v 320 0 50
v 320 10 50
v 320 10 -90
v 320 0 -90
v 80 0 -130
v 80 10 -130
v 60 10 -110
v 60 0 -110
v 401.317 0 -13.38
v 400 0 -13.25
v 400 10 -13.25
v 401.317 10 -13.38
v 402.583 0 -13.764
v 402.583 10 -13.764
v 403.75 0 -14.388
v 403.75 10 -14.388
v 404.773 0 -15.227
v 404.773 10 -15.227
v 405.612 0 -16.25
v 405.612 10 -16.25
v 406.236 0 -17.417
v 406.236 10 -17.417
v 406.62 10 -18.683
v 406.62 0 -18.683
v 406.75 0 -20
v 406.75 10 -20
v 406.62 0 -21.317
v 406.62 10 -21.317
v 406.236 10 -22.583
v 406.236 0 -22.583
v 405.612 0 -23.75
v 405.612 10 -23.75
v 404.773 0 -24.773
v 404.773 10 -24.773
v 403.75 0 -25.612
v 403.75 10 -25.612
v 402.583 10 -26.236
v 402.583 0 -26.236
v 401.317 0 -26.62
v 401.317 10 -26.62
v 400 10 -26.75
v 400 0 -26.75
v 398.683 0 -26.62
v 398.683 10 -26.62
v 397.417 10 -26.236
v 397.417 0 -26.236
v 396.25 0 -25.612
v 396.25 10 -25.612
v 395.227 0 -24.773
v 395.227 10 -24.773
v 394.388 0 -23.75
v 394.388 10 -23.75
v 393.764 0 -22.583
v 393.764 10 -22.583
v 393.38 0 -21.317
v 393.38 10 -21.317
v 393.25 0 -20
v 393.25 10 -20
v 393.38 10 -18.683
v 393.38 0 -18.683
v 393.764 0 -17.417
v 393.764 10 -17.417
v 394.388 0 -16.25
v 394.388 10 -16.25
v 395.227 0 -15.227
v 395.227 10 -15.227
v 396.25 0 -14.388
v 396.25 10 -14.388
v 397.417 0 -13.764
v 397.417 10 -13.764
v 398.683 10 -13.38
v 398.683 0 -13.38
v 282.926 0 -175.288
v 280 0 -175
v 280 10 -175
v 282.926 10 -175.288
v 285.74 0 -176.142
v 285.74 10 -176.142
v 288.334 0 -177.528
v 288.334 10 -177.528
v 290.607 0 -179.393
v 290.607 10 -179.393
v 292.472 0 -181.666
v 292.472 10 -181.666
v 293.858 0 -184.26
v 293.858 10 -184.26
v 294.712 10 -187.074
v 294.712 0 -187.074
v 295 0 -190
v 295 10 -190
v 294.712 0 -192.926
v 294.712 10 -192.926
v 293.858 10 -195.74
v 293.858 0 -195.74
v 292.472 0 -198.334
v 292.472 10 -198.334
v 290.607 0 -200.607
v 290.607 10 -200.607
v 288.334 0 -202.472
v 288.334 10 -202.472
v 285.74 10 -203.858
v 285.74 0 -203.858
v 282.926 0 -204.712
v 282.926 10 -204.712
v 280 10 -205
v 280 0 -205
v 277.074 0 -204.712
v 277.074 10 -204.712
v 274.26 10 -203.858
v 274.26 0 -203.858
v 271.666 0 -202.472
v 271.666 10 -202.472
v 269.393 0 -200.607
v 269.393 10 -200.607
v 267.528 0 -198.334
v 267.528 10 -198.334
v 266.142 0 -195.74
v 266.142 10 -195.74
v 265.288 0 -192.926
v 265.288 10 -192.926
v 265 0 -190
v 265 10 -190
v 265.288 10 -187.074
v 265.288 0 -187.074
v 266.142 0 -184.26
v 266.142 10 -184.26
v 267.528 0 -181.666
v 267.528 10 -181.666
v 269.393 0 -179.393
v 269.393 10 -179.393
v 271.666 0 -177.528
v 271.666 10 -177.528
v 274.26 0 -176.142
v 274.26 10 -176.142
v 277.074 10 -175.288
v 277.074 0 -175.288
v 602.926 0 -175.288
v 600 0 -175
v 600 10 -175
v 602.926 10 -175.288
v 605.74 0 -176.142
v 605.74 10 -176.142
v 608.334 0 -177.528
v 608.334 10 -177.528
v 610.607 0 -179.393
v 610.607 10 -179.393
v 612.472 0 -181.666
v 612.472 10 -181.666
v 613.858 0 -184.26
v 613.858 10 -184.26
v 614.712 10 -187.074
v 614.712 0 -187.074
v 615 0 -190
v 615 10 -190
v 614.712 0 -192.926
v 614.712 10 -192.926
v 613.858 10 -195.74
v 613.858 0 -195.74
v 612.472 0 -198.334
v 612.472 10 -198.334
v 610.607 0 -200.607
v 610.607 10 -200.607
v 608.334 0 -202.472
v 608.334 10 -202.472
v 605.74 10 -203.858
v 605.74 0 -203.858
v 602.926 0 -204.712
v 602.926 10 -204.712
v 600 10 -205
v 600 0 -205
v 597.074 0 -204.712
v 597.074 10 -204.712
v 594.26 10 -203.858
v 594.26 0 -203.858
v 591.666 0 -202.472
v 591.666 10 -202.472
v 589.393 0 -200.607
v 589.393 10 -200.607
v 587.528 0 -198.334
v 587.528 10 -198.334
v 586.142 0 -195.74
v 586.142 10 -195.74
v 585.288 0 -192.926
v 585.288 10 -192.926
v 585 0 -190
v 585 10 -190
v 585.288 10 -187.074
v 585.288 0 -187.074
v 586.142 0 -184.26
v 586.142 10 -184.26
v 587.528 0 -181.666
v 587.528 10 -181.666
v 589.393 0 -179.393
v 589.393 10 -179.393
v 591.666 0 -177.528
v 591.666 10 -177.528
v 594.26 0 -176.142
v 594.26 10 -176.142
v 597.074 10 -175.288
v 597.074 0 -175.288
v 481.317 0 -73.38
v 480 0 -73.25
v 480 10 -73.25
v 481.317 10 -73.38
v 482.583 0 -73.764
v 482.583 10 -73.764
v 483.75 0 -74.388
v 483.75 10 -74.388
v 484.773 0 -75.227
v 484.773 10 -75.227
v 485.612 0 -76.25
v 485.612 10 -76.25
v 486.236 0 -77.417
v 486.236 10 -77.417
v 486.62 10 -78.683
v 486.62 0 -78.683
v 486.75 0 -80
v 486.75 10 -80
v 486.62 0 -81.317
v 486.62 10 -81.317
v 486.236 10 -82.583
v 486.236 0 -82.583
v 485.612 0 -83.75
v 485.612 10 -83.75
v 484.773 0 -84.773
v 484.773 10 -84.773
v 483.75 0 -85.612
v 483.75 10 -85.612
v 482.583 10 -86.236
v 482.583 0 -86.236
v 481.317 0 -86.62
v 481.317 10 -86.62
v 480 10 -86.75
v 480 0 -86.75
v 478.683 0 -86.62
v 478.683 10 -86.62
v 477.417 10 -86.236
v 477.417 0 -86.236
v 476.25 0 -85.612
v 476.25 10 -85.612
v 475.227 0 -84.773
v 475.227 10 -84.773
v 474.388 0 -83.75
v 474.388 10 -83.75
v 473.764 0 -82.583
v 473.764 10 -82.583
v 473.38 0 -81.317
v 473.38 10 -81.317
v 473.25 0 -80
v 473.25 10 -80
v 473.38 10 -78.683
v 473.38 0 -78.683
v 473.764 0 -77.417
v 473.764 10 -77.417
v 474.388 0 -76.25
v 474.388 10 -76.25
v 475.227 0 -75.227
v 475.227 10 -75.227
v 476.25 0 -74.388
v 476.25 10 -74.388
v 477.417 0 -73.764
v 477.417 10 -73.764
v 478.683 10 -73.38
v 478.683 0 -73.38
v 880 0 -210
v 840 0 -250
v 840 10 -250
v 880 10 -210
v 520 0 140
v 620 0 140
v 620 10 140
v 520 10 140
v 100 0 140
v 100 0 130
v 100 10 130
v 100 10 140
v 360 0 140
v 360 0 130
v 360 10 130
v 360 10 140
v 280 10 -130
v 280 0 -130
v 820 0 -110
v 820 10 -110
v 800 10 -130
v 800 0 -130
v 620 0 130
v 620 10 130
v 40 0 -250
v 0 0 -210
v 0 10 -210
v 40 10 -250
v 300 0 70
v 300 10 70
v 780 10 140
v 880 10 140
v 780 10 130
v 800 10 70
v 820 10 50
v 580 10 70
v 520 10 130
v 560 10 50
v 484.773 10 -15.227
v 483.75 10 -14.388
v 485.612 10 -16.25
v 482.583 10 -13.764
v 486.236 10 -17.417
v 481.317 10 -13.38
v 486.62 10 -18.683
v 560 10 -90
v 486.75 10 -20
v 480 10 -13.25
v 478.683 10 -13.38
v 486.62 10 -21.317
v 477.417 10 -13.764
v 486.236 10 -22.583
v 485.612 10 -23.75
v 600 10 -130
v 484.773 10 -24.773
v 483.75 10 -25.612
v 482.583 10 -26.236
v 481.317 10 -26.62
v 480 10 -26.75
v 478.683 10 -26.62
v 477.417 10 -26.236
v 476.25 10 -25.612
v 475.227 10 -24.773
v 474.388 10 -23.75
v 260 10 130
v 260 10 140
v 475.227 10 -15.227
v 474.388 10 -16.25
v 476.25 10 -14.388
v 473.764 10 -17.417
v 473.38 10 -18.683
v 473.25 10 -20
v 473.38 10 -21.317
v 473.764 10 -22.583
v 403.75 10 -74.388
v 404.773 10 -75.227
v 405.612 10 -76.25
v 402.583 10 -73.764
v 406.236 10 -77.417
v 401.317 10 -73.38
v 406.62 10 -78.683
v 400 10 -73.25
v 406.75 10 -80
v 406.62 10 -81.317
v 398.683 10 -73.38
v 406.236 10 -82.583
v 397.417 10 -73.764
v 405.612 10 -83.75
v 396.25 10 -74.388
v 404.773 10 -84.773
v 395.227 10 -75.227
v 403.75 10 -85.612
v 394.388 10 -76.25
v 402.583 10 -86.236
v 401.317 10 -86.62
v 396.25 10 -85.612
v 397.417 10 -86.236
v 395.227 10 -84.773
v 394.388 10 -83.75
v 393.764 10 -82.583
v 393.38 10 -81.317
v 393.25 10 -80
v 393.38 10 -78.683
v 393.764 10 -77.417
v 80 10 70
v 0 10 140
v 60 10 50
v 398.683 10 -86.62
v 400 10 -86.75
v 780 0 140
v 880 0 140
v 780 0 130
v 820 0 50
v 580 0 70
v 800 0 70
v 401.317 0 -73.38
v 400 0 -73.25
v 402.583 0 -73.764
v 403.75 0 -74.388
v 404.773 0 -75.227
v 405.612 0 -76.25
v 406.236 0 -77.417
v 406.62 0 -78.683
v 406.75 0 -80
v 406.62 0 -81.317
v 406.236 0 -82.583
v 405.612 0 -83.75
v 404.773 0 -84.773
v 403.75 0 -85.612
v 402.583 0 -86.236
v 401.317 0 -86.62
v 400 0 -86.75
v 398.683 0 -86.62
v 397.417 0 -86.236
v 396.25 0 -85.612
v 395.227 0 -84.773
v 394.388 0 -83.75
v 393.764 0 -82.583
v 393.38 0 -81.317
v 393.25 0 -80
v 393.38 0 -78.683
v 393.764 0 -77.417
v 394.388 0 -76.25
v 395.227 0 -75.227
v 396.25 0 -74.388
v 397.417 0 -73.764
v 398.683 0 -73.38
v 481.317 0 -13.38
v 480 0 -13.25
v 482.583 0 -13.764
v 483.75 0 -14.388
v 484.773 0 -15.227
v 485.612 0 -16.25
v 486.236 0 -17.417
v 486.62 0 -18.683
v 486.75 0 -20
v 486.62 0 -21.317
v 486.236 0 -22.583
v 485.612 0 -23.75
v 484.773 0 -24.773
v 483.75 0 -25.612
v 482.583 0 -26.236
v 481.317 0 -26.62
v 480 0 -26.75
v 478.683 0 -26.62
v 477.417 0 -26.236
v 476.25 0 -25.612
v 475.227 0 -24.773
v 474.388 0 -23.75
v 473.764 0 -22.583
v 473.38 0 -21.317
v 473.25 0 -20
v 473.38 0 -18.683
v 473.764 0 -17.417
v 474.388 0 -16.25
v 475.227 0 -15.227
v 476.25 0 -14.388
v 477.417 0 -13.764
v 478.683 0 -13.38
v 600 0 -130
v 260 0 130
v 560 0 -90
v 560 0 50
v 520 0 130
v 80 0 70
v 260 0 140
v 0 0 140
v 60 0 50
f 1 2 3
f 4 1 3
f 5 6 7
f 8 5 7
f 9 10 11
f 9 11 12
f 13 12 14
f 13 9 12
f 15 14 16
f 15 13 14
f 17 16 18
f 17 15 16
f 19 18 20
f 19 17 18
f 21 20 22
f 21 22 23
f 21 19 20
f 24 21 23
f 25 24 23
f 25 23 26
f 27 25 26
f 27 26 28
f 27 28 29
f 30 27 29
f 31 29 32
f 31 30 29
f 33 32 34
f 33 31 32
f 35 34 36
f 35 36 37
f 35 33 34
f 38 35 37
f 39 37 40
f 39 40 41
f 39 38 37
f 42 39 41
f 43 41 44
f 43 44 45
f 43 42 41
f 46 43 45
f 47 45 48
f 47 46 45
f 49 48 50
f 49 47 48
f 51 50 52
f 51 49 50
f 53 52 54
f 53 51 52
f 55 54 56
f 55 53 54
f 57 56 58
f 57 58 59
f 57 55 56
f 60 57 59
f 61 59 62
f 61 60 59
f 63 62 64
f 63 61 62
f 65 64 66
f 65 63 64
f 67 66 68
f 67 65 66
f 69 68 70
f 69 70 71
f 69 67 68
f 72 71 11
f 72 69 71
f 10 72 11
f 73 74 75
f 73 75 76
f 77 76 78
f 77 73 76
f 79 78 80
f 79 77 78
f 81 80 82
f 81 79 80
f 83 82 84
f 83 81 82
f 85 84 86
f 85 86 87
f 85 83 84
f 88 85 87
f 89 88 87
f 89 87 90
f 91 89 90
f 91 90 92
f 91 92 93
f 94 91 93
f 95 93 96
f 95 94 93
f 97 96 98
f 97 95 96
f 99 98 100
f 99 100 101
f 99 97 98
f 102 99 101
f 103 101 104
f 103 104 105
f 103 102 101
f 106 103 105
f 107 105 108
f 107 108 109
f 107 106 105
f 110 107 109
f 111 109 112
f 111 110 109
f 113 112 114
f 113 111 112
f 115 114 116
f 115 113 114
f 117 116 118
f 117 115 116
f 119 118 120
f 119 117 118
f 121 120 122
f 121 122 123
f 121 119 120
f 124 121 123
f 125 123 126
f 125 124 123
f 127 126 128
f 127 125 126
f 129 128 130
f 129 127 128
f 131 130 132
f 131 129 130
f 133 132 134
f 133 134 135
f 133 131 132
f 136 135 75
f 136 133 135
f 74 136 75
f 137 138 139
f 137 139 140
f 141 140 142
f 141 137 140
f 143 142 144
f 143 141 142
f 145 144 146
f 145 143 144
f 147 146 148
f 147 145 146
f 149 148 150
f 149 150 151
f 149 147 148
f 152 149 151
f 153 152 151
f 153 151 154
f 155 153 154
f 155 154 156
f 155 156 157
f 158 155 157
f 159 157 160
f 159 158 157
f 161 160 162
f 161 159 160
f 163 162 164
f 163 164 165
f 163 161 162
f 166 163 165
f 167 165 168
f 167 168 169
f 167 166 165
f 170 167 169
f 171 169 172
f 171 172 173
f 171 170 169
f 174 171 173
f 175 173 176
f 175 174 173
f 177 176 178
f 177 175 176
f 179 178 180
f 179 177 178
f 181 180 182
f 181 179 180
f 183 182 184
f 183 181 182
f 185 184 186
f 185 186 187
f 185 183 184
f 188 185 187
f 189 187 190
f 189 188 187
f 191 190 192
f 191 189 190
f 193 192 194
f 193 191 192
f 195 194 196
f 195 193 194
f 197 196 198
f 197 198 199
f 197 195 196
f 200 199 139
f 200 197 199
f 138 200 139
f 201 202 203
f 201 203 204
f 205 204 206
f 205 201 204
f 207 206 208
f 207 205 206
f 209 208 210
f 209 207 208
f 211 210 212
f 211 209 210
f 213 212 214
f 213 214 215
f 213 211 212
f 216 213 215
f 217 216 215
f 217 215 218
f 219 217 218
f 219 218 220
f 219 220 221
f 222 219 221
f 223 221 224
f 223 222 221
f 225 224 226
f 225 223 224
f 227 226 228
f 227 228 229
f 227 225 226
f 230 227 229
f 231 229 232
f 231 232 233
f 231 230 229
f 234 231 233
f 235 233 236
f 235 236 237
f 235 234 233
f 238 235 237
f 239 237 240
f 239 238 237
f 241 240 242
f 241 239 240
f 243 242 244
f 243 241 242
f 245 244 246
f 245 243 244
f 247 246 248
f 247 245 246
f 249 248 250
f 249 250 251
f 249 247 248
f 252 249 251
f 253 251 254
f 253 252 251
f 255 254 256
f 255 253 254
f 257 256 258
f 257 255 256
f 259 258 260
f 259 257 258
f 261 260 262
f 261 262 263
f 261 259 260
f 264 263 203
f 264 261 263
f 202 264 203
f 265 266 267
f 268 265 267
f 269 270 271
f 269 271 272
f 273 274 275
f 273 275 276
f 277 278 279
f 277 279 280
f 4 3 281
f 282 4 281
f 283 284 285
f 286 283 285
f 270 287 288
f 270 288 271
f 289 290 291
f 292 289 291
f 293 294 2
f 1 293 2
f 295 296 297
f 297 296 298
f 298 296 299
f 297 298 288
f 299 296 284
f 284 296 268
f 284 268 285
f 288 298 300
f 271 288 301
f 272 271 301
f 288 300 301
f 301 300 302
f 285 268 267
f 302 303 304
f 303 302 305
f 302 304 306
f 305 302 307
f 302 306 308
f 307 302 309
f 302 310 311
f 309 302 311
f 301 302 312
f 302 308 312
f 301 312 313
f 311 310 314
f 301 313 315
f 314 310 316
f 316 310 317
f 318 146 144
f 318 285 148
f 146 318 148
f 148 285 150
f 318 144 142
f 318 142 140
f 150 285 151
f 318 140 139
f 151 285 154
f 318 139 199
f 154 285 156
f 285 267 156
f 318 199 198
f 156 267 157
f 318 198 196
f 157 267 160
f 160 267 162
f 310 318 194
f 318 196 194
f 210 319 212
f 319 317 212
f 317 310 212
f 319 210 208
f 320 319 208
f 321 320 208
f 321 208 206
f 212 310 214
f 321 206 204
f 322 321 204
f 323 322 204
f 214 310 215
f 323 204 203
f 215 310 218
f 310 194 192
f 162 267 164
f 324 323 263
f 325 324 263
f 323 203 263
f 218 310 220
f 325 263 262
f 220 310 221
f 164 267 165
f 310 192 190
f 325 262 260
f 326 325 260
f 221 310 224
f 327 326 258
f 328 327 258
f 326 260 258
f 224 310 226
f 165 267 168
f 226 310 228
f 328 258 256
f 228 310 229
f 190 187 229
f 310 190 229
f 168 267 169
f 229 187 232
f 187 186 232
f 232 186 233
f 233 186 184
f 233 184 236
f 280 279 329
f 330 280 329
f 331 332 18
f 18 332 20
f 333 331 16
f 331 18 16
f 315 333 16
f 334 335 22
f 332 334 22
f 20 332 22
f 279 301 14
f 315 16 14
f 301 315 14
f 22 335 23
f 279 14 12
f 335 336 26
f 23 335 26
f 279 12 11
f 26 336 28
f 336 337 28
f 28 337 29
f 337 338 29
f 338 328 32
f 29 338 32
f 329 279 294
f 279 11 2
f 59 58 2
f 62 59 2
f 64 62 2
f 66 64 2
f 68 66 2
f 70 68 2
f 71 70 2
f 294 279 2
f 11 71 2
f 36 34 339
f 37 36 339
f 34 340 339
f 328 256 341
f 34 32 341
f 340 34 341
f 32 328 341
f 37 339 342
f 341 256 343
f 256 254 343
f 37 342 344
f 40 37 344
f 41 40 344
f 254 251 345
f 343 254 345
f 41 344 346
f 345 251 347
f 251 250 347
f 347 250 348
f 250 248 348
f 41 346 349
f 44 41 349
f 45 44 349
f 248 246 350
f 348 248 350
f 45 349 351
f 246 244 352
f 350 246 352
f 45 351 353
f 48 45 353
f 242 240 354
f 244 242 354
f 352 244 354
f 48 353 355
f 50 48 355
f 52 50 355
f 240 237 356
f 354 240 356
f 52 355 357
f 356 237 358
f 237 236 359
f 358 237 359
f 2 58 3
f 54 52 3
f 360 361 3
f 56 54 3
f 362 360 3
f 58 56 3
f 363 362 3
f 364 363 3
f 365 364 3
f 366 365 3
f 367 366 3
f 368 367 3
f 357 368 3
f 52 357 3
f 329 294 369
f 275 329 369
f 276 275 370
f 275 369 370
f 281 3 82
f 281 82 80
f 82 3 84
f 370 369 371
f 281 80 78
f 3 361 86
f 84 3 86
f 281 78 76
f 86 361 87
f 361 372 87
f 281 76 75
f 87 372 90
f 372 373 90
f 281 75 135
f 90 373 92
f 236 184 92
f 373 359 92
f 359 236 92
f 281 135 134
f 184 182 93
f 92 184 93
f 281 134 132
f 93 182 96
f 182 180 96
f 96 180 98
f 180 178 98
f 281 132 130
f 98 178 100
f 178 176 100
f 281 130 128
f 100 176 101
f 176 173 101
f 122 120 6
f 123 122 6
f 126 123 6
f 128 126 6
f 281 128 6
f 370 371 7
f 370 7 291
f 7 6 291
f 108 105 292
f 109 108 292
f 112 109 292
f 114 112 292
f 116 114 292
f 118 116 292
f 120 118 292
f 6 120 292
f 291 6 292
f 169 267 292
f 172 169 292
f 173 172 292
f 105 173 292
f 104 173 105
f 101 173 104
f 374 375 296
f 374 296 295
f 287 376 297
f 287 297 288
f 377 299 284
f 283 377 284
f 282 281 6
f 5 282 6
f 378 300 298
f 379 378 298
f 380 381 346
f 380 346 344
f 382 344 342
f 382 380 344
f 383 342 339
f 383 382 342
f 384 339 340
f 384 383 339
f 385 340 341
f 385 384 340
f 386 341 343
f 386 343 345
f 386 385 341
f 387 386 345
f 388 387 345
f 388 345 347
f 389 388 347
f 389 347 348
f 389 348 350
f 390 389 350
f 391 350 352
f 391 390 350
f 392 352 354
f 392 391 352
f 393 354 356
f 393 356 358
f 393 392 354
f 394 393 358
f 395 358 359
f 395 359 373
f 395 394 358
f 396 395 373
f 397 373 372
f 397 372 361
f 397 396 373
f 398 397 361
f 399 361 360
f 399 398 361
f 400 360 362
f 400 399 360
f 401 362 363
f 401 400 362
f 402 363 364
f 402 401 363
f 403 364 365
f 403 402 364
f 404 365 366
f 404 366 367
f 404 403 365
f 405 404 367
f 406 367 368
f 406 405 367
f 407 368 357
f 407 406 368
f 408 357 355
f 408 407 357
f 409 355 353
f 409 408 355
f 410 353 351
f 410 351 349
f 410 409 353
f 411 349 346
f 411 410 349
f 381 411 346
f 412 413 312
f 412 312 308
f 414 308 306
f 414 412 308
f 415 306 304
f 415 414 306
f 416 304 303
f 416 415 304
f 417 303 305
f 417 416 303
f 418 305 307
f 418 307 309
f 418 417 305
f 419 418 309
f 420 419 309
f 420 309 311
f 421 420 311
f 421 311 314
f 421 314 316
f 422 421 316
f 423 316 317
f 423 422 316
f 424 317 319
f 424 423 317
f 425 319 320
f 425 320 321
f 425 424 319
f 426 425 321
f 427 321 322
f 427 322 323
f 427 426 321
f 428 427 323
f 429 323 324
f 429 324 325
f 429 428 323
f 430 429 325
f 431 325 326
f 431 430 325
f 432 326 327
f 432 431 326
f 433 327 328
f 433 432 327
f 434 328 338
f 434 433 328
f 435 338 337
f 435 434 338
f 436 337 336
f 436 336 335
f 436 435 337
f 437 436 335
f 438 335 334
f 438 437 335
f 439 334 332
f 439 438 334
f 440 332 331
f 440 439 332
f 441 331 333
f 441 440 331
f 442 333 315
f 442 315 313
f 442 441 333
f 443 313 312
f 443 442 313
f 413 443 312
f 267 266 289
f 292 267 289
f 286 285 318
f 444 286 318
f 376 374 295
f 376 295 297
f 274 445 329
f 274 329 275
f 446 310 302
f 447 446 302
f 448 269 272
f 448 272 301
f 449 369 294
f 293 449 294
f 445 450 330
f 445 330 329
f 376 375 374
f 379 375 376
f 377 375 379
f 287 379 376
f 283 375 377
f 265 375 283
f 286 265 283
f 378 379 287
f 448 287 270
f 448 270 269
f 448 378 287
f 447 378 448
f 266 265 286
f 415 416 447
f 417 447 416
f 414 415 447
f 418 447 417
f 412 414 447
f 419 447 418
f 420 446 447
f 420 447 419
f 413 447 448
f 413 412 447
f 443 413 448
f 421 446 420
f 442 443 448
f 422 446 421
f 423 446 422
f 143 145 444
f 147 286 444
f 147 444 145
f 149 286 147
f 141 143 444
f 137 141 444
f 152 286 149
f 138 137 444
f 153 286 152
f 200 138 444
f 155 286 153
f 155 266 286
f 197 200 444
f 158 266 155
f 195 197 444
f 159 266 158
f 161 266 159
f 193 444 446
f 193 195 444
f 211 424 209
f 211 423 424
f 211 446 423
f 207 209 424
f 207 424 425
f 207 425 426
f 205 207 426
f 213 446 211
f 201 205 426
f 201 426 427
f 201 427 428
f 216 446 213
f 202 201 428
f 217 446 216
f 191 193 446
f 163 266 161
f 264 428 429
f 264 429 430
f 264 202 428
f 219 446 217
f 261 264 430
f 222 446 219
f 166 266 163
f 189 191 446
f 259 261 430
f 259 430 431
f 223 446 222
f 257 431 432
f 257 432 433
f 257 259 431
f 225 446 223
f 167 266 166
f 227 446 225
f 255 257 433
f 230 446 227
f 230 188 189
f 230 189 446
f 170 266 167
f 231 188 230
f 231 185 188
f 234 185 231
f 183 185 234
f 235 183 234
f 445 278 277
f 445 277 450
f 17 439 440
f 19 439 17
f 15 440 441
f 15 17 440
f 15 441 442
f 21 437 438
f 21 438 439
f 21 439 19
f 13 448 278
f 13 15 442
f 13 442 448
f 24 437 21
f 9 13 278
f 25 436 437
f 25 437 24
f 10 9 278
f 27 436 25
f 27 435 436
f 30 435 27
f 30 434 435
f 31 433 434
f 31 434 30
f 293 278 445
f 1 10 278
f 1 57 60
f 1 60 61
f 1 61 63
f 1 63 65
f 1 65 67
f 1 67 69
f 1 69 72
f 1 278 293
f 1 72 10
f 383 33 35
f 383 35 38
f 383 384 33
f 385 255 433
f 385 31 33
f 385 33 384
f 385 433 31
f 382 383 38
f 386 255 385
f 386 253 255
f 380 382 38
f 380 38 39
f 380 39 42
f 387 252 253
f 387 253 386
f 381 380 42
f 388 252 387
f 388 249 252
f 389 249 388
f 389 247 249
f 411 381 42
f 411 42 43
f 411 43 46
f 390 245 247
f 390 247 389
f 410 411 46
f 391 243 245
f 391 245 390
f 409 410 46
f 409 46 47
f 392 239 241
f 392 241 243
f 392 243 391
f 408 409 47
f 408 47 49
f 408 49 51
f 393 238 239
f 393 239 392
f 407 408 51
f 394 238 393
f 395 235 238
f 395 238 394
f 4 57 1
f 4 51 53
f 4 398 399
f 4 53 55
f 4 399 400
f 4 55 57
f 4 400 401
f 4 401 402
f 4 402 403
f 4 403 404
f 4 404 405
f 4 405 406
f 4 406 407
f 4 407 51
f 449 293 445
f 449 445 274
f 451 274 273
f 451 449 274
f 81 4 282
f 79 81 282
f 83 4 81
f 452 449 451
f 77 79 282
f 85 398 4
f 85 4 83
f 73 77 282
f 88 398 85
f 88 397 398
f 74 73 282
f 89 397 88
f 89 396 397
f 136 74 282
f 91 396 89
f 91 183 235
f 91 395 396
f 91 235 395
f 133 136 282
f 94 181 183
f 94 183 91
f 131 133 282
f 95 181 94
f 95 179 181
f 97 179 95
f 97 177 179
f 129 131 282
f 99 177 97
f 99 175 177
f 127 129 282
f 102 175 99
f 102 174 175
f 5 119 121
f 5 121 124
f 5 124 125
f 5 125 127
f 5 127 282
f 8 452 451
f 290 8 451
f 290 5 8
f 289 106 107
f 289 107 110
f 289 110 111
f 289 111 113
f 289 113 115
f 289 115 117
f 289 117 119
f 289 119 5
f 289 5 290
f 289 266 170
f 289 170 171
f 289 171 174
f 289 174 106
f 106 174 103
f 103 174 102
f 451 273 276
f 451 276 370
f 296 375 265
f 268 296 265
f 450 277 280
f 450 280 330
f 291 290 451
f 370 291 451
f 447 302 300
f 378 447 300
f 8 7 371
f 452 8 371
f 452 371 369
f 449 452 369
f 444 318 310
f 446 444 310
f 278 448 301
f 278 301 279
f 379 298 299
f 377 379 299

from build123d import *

# Parameters (mm, degrees)
ESQUISSE1_R             = 6.75
ESQUISSE1_R_2           = 15
BOSS_EXTRU_1_DEPTH      = 10
ENL_V_MAT_EXTRU_1_DEPTH = 10
CHANFREIN1_SIZE         = 40


with BuildPart() as part:
    # Esquisse1 → Boss.-Extru.1 (new body)
    with BuildSketch(Plane(origin=(0, 0, 0), x_dir=(1, 0, 0), z_dir=(0, 1, 0))):
        Polygon((0, 0), (0, 250), (240, 250), (320, 250), (560, 250), (640, 250), (880, 250), (880, 0), (880, -140), (780, -140), (780, -130), (620, -130), (620, -140), (520, -140), (520, -130), (360, -130), (360, -140), (260, -140), (260, -130), (100, -130), (100, -140), (0, -140), align=None)
        with Locations(Location((480, 20, 0), (0, 0, 270))):
            Circle(ESQUISSE1_R, mode=Mode.SUBTRACT)
        with Locations(Location((400, 20, 0), (0, 0, 270))):
            Circle(ESQUISSE1_R, mode=Mode.SUBTRACT)
        with Locations(Location((400, 80, 0), (0, 0, 270))):
            Circle(ESQUISSE1_R, mode=Mode.SUBTRACT)
        with Locations(Location((480, 80, 0), (0, 0, 270))):
            Circle(ESQUISSE1_R, mode=Mode.SUBTRACT)
        with Locations(Location((280, 190, 0), (0, 0, 270))):
            Circle(ESQUISSE1_R_2, mode=Mode.SUBTRACT)
        with Locations(Location((600, 190, 0), (0, 0, 270))):
            Circle(ESQUISSE1_R_2, mode=Mode.SUBTRACT)
    extrude(amount=BOSS_EXTRU_1_DEPTH)

    # Esquisse2 → Enlèv. mat.-Extru.1 (cut)
    with BuildSketch(Plane(origin=(0, 10, 0), x_dir=(1, 0, 0), z_dir=(0, 1, 0))):
        Polygon((800, 130), (600, 130), (560, 90), (560, -50), (580, -70), (800, -70), (820, -50), (820, 110), align=None)
        Polygon((80, 130), (60, 110), (60, -50), (80, -70), (300, -70), (320, -50), (320, 90), (280, 130), align=None)
    extrude(amount=-ENL_V_MAT_EXTRU_1_DEPTH, mode=Mode.SUBTRACT)

    # Chanfrein1
    chanfrein1_edges = [part.edges().sort_by_distance(p)[0] for p in [
        (0, 5, -250),
        (880, 5, -250),
    ]]
    chamfer(chanfrein1_edges, length=CHANFREIN1_SIZE)


solid = part.part
